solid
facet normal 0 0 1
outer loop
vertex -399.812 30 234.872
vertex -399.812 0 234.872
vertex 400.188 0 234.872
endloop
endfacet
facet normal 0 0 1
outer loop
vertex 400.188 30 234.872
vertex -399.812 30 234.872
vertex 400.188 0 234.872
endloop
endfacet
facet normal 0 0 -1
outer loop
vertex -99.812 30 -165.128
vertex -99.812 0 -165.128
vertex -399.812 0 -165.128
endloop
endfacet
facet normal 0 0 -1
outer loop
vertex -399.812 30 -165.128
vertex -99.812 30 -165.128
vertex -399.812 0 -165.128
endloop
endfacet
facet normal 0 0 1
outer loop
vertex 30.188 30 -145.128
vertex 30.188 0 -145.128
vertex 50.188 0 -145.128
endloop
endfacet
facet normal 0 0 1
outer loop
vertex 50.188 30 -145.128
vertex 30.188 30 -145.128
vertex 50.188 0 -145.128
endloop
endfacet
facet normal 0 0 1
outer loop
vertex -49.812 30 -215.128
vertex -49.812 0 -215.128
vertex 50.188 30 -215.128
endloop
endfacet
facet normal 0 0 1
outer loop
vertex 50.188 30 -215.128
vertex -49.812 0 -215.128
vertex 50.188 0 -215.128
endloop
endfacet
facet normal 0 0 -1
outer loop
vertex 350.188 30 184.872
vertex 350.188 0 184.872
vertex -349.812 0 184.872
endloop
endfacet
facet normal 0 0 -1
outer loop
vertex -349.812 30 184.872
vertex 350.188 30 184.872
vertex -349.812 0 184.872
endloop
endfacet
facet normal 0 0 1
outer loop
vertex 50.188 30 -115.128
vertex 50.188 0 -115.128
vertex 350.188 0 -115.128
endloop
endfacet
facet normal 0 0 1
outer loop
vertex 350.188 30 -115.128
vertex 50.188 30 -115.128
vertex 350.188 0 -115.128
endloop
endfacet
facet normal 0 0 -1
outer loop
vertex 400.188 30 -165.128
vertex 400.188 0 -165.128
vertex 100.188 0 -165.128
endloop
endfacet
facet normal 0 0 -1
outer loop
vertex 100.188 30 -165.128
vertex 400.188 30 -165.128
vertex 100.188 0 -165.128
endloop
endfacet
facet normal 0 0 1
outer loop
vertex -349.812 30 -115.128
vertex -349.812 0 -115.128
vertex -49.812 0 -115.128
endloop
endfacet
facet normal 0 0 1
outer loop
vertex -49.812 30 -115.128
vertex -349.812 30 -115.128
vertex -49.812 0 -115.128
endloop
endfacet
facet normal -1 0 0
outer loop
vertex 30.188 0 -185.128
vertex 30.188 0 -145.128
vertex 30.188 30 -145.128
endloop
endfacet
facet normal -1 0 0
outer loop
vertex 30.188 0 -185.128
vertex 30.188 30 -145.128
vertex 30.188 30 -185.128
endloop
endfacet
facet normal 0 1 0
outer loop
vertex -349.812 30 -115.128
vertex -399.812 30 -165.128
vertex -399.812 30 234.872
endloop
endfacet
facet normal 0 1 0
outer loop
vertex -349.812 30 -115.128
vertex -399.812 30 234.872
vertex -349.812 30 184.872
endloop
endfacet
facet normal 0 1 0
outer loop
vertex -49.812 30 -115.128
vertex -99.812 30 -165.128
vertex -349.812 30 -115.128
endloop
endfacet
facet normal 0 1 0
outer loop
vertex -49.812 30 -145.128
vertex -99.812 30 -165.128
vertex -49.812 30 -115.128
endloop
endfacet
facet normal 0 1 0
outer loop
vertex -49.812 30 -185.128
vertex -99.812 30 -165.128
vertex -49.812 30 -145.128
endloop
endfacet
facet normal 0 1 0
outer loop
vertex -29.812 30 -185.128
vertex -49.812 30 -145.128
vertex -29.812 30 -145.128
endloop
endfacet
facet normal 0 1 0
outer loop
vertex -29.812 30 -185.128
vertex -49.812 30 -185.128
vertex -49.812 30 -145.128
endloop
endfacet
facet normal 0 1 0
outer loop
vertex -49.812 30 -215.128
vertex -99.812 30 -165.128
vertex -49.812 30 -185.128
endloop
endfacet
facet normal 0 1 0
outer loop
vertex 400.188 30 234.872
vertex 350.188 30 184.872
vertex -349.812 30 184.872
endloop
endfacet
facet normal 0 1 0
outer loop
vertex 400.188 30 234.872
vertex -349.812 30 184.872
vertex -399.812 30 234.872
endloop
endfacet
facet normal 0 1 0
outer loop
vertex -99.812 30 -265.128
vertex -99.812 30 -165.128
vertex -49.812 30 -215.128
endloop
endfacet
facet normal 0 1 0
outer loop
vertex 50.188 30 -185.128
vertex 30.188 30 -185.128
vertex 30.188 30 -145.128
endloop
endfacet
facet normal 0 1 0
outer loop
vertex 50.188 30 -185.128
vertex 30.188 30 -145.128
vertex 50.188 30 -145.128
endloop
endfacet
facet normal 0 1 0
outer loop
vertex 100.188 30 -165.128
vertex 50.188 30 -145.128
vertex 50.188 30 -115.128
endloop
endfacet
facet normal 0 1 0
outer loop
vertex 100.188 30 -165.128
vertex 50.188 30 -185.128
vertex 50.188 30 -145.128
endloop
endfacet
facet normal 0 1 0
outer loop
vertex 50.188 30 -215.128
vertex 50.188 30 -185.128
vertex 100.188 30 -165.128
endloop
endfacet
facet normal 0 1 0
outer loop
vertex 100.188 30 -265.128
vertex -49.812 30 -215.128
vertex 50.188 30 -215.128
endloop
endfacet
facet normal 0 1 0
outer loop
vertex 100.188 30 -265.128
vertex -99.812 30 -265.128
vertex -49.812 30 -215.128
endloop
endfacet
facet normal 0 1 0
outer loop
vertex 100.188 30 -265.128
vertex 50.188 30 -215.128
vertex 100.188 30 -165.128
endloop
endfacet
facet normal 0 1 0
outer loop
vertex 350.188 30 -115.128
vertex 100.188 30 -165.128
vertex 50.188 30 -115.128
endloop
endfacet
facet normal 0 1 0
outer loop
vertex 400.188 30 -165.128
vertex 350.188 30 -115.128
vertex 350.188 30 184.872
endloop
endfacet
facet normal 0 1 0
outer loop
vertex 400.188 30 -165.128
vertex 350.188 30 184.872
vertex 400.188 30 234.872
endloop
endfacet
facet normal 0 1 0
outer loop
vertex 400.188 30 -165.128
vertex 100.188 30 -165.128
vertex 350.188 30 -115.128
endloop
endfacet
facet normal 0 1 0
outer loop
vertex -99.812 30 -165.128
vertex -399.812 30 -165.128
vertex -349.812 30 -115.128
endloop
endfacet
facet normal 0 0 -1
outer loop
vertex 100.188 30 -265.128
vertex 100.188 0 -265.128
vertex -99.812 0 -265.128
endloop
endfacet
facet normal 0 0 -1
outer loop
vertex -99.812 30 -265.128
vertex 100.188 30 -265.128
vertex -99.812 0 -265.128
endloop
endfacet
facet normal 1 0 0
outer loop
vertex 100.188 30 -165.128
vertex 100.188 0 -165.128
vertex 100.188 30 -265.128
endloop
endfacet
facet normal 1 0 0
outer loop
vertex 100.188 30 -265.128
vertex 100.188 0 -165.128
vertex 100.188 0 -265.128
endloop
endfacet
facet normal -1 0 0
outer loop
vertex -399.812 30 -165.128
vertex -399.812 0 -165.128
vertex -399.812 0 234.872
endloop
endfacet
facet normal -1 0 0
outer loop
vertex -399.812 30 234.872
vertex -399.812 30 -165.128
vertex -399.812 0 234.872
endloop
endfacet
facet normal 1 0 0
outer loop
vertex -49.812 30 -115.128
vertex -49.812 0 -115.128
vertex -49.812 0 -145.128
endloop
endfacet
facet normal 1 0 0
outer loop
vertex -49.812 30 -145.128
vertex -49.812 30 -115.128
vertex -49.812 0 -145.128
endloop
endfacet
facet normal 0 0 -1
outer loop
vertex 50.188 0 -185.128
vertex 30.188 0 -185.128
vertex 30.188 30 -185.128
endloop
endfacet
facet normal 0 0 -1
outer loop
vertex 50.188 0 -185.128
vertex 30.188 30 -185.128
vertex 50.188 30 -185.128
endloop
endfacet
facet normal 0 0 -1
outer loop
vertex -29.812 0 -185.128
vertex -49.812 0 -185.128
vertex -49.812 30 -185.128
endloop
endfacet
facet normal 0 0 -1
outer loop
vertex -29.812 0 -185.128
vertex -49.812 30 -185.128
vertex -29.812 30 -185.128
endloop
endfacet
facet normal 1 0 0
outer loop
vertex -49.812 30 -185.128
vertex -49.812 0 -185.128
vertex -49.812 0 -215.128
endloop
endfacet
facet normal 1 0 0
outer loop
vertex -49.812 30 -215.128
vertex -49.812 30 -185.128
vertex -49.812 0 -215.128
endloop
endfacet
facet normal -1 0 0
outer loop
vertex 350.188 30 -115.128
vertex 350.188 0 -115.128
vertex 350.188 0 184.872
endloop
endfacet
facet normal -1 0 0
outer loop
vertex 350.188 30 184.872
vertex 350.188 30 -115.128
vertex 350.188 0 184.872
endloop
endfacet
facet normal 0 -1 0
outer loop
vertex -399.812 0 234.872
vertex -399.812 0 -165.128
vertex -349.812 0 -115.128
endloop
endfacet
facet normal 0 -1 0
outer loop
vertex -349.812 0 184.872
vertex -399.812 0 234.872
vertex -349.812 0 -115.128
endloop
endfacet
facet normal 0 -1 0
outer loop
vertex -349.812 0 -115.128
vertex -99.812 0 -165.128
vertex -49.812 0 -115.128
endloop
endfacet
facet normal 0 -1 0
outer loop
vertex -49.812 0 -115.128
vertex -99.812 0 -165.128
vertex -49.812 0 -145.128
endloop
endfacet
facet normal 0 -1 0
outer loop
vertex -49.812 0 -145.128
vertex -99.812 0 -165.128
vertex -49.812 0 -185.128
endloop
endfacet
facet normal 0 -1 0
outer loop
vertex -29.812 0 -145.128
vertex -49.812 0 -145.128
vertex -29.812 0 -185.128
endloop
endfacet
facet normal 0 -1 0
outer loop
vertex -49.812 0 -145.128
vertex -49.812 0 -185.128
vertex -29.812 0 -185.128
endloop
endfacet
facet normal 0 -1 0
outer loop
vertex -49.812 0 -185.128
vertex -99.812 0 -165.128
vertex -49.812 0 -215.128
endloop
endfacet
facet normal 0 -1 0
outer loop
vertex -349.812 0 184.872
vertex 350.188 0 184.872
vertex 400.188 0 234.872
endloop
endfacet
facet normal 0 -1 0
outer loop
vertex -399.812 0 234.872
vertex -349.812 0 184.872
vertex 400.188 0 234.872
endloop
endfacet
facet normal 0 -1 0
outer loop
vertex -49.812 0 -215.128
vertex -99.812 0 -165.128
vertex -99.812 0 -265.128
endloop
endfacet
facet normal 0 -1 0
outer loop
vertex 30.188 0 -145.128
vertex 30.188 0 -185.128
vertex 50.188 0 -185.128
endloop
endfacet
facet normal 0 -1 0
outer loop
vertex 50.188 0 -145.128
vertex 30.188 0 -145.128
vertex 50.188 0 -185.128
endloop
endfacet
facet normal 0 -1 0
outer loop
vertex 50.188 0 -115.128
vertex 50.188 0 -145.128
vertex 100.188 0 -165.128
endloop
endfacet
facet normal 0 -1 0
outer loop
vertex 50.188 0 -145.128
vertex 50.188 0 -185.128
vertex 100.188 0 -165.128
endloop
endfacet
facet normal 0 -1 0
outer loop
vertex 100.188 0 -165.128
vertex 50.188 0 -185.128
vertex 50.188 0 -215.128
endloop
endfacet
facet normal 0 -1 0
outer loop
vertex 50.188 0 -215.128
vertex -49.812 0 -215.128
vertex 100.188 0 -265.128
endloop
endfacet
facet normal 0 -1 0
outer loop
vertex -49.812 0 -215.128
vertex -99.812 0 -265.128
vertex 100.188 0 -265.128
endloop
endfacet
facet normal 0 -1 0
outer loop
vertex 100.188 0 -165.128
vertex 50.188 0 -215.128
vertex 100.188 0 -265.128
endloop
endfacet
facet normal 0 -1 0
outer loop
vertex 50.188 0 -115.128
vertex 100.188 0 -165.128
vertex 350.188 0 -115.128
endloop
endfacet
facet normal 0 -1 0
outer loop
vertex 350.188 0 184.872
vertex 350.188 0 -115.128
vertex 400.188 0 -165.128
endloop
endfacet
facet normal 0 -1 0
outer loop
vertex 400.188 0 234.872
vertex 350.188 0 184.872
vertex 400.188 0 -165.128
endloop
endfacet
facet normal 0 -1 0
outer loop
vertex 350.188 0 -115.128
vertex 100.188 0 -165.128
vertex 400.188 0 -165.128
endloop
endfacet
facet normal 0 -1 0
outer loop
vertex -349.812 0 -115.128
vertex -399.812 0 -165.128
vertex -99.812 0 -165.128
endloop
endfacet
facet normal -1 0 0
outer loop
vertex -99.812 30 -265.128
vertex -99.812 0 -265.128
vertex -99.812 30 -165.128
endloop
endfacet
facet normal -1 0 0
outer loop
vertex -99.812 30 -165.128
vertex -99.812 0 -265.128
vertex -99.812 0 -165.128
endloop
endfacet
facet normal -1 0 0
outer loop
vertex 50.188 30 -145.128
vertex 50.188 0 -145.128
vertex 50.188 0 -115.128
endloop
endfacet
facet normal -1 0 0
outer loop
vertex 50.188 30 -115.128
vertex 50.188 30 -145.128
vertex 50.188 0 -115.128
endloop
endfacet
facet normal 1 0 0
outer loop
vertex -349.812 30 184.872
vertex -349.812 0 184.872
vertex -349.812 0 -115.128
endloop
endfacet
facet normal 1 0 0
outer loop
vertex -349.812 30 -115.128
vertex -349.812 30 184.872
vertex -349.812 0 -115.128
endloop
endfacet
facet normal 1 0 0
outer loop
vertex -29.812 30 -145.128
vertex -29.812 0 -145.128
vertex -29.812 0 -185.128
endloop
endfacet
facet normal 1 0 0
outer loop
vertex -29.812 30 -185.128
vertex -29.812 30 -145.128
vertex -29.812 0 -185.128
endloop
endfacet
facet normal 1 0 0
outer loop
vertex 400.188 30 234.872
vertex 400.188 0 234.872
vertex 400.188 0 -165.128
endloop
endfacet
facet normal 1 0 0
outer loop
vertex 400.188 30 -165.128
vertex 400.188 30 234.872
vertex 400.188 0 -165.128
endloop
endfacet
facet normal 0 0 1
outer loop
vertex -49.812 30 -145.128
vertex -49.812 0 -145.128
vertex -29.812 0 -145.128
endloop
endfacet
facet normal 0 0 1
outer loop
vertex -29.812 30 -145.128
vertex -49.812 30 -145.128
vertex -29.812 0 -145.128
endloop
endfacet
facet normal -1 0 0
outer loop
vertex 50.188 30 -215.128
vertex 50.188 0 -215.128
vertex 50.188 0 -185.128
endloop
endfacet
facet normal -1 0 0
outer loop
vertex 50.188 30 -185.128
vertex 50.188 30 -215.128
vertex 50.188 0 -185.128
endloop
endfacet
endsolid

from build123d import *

# Parameters (mm, degrees)
SKETCH1_W           = 20
SKETCH1_H           = 40
BOSS_EXTRUDE1_DEPTH = 30


with BuildPart() as part:
    # Sketch1 → Boss-Extrude1 (new body)
    with BuildSketch(Plane(origin=(0, 0, 0), x_dir=(1, 0, 0), z_dir=(0, 1, 0))):
        Polygon((-99.811676083, 165.128212813), (-399.811676083, 165.128212813), (-399.811676083, -234.871787187), (400.188323917, -234.871787187), (400.188323917, 165.128212813), (100.188323917, 165.128212813), (50.188323917, 165.128212813), (50.188323917, 145.128212813), (50.188323917, 115.128212813), (350.188323917, 115.128212813), (350.188323917, -184.871787187), (-349.811676083, -184.871787187), (-349.811676083, 115.128212813), (-49.811676083, 115.128212813), (-49.811676083, 145.128212813), (-49.811676083, 165.128212813), align=None)
        Polygon((-99.811676083, 265.128212813), (-99.811676083, 165.128212813), (-49.811676083, 165.128212813), (-49.811676083, 185.128212813), (-49.811676083, 215.128212813), (50.188323917, 215.128212813), (50.188323917, 185.128212813), (50.188323917, 165.128212813), (100.188323917, 165.128212813), (100.188323917, 265.128212813), align=None)
        with Locations((-39.811676083, 165.128212813)):
            Rectangle(SKETCH1_W, SKETCH1_H)
        with Locations((40.188323917, 165.128212813)):
            Rectangle(SKETCH1_W, SKETCH1_H)
    extrude(amount=BOSS_EXTRUDE1_DEPTH)


solid = part.part
